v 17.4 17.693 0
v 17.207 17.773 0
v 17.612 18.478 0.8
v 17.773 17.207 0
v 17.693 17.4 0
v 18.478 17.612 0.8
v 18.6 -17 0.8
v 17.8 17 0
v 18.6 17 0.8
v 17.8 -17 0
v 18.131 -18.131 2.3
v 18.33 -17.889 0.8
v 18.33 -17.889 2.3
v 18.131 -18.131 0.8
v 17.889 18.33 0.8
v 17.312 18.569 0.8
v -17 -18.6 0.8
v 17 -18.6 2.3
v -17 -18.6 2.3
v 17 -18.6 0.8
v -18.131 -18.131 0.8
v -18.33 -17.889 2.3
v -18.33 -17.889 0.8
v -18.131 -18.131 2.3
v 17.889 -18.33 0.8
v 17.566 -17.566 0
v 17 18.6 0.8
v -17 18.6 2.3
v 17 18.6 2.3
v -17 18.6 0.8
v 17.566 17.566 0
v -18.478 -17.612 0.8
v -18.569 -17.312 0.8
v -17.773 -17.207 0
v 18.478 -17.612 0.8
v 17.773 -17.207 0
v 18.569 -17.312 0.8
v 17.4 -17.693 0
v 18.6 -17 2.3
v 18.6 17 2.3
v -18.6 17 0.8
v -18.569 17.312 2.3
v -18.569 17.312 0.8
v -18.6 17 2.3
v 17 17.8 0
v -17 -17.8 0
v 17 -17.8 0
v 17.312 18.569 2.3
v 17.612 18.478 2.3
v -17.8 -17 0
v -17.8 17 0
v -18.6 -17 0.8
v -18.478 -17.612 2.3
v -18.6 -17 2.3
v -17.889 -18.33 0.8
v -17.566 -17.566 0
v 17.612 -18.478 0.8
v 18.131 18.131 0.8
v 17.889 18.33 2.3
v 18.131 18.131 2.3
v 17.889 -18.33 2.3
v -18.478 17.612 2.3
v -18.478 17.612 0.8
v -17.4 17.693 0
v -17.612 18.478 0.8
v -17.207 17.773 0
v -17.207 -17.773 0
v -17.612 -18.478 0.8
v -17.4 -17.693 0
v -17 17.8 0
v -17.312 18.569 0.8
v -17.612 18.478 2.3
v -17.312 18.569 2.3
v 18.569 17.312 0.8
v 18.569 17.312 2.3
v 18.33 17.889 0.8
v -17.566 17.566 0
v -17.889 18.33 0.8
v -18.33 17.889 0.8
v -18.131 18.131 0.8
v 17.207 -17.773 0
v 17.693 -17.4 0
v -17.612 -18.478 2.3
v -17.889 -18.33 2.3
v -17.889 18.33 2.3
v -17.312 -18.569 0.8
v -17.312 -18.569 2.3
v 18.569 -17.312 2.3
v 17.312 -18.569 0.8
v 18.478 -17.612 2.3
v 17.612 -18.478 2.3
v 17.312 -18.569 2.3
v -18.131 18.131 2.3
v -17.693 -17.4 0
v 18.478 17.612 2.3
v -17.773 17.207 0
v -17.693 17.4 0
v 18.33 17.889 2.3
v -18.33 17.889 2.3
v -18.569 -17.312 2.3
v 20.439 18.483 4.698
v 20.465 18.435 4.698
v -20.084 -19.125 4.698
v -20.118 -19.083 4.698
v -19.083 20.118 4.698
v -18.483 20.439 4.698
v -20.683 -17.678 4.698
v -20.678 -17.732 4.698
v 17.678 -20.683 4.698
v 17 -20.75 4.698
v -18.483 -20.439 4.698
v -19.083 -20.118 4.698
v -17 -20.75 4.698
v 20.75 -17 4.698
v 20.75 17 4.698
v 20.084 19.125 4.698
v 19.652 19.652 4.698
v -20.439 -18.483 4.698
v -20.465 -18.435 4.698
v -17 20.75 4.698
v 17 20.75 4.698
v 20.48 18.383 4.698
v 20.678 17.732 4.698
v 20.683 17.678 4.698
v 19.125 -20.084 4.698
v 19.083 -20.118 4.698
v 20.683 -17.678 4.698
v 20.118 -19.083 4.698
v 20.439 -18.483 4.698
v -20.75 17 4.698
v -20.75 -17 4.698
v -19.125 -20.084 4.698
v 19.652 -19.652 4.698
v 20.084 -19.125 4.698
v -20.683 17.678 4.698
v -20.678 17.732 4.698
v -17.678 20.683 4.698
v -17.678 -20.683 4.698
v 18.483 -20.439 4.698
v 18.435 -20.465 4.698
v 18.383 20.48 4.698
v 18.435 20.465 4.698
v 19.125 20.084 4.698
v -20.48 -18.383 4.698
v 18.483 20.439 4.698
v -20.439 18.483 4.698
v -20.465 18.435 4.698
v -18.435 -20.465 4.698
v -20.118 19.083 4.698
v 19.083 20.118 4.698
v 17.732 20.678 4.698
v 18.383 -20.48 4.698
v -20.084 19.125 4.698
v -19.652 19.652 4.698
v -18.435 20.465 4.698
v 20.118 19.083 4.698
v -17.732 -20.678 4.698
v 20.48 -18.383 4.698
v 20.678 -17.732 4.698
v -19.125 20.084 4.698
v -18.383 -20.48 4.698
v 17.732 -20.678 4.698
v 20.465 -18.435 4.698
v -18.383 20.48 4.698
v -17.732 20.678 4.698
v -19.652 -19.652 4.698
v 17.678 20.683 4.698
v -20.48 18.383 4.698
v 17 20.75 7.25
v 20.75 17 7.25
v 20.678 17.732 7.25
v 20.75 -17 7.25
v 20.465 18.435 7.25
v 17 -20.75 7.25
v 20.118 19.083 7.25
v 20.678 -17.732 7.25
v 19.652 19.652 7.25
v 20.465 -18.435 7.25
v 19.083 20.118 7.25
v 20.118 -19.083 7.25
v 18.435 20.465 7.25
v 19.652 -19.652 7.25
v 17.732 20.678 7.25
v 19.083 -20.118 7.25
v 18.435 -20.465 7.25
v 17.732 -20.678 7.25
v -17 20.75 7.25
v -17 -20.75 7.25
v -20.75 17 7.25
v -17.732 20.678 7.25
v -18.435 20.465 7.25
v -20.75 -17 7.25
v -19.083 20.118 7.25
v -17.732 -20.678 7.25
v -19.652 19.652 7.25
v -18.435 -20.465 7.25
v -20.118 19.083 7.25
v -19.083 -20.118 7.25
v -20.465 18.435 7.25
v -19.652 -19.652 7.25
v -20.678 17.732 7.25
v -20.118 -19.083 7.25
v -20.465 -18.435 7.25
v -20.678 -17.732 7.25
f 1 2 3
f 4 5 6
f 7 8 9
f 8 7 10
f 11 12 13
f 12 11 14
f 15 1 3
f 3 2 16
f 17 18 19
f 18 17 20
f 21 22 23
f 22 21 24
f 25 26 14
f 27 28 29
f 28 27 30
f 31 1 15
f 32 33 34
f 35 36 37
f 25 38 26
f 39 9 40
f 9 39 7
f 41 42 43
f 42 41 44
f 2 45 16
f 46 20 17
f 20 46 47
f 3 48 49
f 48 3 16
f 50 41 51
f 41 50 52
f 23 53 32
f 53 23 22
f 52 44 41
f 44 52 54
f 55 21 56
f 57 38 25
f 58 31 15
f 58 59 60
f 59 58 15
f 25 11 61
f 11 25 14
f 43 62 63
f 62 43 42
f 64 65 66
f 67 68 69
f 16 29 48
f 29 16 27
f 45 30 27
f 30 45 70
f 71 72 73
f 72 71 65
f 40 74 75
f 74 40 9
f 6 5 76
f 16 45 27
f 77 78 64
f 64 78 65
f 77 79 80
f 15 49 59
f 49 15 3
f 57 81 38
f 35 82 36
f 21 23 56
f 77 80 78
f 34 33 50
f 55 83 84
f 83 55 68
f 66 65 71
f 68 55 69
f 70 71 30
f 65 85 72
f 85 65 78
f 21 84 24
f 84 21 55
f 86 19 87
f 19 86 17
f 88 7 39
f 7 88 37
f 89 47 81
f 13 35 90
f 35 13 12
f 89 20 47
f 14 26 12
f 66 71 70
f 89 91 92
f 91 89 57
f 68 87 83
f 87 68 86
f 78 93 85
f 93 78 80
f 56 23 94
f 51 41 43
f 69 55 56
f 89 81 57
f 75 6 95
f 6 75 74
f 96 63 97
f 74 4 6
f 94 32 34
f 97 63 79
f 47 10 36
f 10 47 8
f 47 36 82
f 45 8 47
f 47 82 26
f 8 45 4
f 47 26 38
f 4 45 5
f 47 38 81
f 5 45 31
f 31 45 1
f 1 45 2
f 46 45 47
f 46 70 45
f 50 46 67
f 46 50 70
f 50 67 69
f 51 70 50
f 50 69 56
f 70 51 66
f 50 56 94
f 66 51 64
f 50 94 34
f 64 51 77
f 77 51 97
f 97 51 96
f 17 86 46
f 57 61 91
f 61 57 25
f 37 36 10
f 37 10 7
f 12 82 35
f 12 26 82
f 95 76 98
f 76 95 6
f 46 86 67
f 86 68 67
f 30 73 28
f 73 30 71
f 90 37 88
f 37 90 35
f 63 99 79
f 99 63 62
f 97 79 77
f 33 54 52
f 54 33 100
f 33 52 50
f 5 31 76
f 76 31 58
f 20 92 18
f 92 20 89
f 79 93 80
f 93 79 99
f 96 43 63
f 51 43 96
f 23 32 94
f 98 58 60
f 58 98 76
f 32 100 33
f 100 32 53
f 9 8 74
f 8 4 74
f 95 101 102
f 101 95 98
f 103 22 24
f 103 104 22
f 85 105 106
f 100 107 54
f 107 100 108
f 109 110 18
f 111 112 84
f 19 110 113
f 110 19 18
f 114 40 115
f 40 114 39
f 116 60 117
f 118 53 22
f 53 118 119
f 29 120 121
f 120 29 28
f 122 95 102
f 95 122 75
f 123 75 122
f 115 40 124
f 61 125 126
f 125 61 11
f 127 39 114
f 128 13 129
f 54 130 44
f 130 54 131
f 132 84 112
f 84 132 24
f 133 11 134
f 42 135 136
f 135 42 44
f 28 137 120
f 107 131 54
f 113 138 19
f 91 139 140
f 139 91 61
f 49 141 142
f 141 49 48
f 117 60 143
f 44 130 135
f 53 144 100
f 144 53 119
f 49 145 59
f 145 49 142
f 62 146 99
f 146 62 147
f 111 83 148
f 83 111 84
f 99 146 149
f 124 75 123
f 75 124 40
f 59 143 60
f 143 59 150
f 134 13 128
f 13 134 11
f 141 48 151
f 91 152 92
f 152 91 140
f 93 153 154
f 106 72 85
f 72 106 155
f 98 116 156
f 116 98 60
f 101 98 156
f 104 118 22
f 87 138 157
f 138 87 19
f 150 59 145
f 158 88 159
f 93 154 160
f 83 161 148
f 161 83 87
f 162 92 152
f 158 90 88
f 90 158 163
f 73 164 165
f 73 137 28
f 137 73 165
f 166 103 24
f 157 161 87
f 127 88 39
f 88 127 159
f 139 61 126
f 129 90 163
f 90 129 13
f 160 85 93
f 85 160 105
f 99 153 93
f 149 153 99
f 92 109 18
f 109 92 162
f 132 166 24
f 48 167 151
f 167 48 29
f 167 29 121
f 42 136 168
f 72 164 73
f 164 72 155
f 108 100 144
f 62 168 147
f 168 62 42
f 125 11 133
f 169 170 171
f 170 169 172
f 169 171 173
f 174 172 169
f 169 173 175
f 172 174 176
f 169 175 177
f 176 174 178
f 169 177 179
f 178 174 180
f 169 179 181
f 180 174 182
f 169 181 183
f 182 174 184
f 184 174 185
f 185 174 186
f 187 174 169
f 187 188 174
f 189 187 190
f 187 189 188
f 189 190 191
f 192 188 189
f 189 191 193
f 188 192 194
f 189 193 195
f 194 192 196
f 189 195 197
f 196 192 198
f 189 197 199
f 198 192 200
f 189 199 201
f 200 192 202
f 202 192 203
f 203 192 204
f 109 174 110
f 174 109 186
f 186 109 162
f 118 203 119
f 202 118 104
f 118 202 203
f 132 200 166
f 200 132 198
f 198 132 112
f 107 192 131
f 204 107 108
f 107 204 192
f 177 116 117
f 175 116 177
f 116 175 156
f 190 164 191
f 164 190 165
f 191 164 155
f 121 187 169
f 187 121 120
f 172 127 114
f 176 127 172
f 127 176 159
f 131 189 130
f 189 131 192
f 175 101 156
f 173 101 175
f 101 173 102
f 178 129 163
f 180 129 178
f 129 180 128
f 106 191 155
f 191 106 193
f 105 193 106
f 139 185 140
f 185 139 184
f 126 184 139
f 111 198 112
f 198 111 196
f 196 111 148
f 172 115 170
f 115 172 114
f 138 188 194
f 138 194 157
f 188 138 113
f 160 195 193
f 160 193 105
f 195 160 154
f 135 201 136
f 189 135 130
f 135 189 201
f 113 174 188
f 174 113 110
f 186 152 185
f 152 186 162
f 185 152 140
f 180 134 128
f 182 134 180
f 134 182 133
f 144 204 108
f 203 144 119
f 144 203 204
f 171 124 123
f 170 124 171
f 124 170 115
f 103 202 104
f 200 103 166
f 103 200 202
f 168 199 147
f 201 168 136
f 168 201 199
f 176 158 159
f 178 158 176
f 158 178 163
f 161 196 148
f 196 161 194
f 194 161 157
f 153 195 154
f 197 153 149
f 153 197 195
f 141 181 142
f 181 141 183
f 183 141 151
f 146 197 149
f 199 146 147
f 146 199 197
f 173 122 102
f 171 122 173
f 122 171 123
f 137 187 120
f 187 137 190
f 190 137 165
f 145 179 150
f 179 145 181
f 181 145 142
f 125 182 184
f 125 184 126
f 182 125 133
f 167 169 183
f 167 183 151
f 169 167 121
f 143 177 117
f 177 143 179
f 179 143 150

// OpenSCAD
//	2024-12-22
//The tile with the short grid very slightly touches the bottom
//I need to slightly move up the tile
//The function is pad_oversize
//bevel2_bottom 2.6->2.3

gridfinity_pitch = 42;
gridfinity_zpitch = 7;
gridfinity_clearance = 0.5; // each bin is undersize by this much

// set this to produce sharp corners on baseplates and bins
// not for general use (breaks compatibility) but may be useful for special cases
sharp_corners = 0;

// basic block with cutout in top to be stackable, optional holes in bottom
// start with this and begin 'carving'
module grid_block(
    num_x = 1,
    num_y = 1,
    num_z = 1,
    magnet_diameter = 6.5,
    screw_depth = 6,
    center = false,
    hole_overhang_remedy = false,
    half_pitch = false,
    box_corner_attachments_only = false
)
{
    corner_radius = 3.75;
    outer_size = gridfinity_pitch - gridfinity_clearance; // typically 41.5
    block_corner_position = outer_size / 2 - corner_radius; // need not match center of pad corners
    magnet_thickness = 2.4;
    magnet_position = min(gridfinity_pitch / 2 - 8, gridfinity_pitch / 2 - 4 - magnet_diameter / 2);
    screw_hole_diam = 3;
    gp = gridfinity_pitch;

    suppress_holes = num_x < 1 || num_y < 1;

    emd = suppress_holes ? 0 : magnet_diameter; // effective magnet diameter after override
    esd = suppress_holes ? 0 : screw_depth; // effective screw depth after override

    overhang_fix = hole_overhang_remedy && emd > 0 && esd > 0;
    overhang_fix_depth = 0.3; // assume this is enough

    totalht = gridfinity_zpitch * num_z + 3.75;

    translate(center ? [-(num_x - 1) * gridfinity_pitch / 2, -(num_y - 1) * gridfinity_pitch / 2, 0] : [0, 0, 0])
    difference()
    {
        intersection()
        {
            union()
            {
                pad_grid(num_x, num_y, half_pitch);
                translate([-gridfinity_pitch / 2, -gridfinity_pitch / 2, 5])
                cube([gridfinity_pitch * num_x, gridfinity_pitch * num_y, totalht - 5]);
            }

            translate([0, 0, -0.1])
            hull()
            cornercopy(block_corner_position, num_x, num_y)
            cylinder(r = corner_radius, h = totalht + 0.2, $fn = 32);
        }

        //color("red")
        //translate([0, 0, gridfinity_zpitch * num_z])
        //pad_oversize(num_x, num_y, 1);

        if (esd > 0)
        {
            gridcopycorners(ceil(num_x), ceil(num_y), magnet_position, box_corner_attachments_only)
            translate([0, 0, -0.1])
            cylinder(d = screw_hole_diam, h = esd + 0.1, $fn = 28);
        }

        if (emd > 0)
        {
            gridcopycorners(ceil(num_x), ceil(num_y), magnet_position, box_corner_attachments_only)
            translate([0, 0, -0.1])
            cylinder(d = emd, h = magnet_thickness + 0.1, $fn = 41);
        }

        if (overhang_fix)
        {
            gridcopycorners(ceil(num_x), ceil(num_y), magnet_position, box_corner_attachments_only)
            translate([0, 0, magnet_thickness - 0.1])
            render()
            intersection()
            {
                translate([-emd / 2, -screw_hole_diam / 2, 0])
                cube([emd, screw_hole_diam, overhang_fix_depth + 0.1]);
                cylinder(d = emd, h = 1, $fn = 41);
            }
        }
    }
}

module pad_grid(num_x, num_y, half_pitch = false)
{
    cut_far_x = (num_x < 1 && !half_pitch) || (num_x < 0.5);
    cut_far_y = (num_y < 1 && !half_pitch) || (num_y < 0.5);

    if (half_pitch)
    {
        gridcopy(ceil(num_x), ceil(num_y))
        intersection()
        {
            pad_halfsize();

            if (cut_far_x)
            {
                translate([gridfinity_pitch * (-0.5 + num_x), 0, 0])
                pad_halfsize();
            }

            if (cut_far_y)
            {
                translate([0, gridfinity_pitch * (-0.5 + num_y), 0])
                pad_halfsize();
            }

            if (cut_far_x && cut_far_y)
            {
                translate([gridfinity_pitch * (-0.5 + num_x), gridfinity_pitch * (-0.5 + num_y), 0])
                pad_halfsize();
            }
        }
    }
    else
    {
        gridcopy(ceil(num_x), ceil(num_y))
        intersection()
        {
            pad_oversize();

            if (cut_far_x)
            {
                translate([gridfinity_pitch * (-1 + num_x), 0, 0])
                pad_oversize();
            }

            if (cut_far_y)
            {
                translate([0, gridfinity_pitch * (-1 + num_y), 0])
                pad_oversize();
            }

            if (cut_far_x && cut_far_y)
            {
                translate([gridfinity_pitch * (-1 + num_x), gridfinity_pitch * (-1 + num_y), 0])
                pad_oversize();
            }
        }
    }
}

module pad_halfsize()
{
    render()
    for (xi = [0 : 1]) for (yi = [0 : 1])
    translate([xi * gridfinity_pitch / 2, yi * gridfinity_pitch / 2, 0])
    intersection()
    {
        pad_oversize();
        translate([-gridfinity_pitch / 2, 0, 0])
        pad_oversize();
        translate([0, -gridfinity_pitch / 2, 0])
        pad_oversize();
        translate([-gridfinity_pitch / 2, -gridfinity_pitch / 2, 0])
        pad_oversize();
    }
}

module cylsq(d, h)
{
    translate([-d / 2, -d / 2, 0])
    cube([d, d, h]);
}

module cylsq2(d1, d2, h)
{
    linear_extrude(height = h, scale = d2 / d1)
    square([d1, d1], center = true);
}

module pad_oversize(num_x = 1, num_y = 1, margins = 0)
{
    pad_corner_position = gridfinity_pitch / 2 - 4; // must be 17 to be compatible
    bevel1_top = 0.8; // z of top of bottom-most bevel (bottom of bevel is at z=0)
    bevel2_bottom = 2.3; // z of bottom of second bevel
    bevel2_top = 5; // z of top of second bevel
    bonus_ht = 0.2; // extra height (and radius) on second bevel

    radialgap = margins ? 0.25 : 0; // oversize cylinders for a bit of clearance
    axialdown = margins ? 0.1 : 0; // a tiny bit of axial clearance present in Zack's design

    translate([0, 0, -axialdown])
    difference()
    {
        union()
        {
            hull()
            cornercopy(pad_corner_position, num_x, num_y)
            {
                if (sharp_corners)
                {
                    cylsq(d = 1.6 + 2 * radialgap, h = 0.1);
                    translate([0, 0, bevel1_top])
                    cylsq(d = 3.2 + 2 * radialgap, h = 1.9);
                }
                else
                {
                    cylinder(d = 1.6 + 2 * radialgap, h = 0.1, $fn = 24);
                    translate([0, 0, bevel1_top])
                    cylinder(d = 3.2 + 2 * radialgap, h = 1.9, $fn = 32);
                }
            }

            hull()
            cornercopy(pad_corner_position, num_x, num_y)
            {
                if (sharp_corners)
                {
                    translate([0, 0, bevel2_bottom])
                    cylsq2(d1 = 3.2 + 2 * radialgap, d2 = 7.5 + 0.5 + 2 * radialgap + 2 * bonus_ht, h = bevel2_top - bevel2_bottom + bonus_ht);
                }
                else
                {
                    translate([0, 0, bevel2_bottom])
                    cylinder(d1 = 3.2 + 2 * radialgap, d2 = 7.5 + 0.5 + 2 * radialgap + 2 * bonus_ht, h = bevel2_top - bevel2_bottom + bonus_ht, $fn = 32);
                }
            }
        }

        if (margins)
        {
            translate([-gridfinity_pitch / 2, -gridfinity_pitch / 2, 0])
            cube([gridfinity_pitch * num_x, gridfinity_pitch * num_y, axialdown]);
        }
    }
}

module gridcopycorners(num_x, num_y, r, onlyBoxCorners = false)
{
    for (xi = [1 : num_x]) for (yi = [1 : num_y])
    for (xx = [-1, 1]) for (yy = [-1, 1])
    if (
        !onlyBoxCorners || 
        (xi == 1 && yi == 1 && xx == -1 && yy == -1) ||
        (xi == num_x && yi == num_y && xx == 1 && yy == 1) ||
        (xi == 1 && yi == num_y && xx == -1 && yy == 1) ||
        (xi == num_x && yi == 1 && xx == 1 && yy == -1)
    )
    {
        translate([gridfinity_pitch * (xi - 1), gridfinity_pitch * (yi - 1), 0])
        translate([xx * r, yy * r, 0])
        children();
    }
}

module cornercopy(r, num_x = 1, num_y = 1)
{
    for (xx = [-r, gridfinity_pitch * (num_x - 1) + r])
    for (yy = [-r, gridfinity_pitch * (num_y - 1) + r])
    translate([xx, yy, 0])
    children();
}

module gridcopy(num_x, num_y)
{
    for (xi = [1 : num_x]) for (yi = [1 : num_y])
    translate([gridfinity_pitch * (xi - 1), gridfinity_pitch * (yi - 1), 0])
    children();
}

grid_block(num_x = 1, num_y = 1, num_z = 0.5, magnet_diameter = 0, screw_depth = 0);
